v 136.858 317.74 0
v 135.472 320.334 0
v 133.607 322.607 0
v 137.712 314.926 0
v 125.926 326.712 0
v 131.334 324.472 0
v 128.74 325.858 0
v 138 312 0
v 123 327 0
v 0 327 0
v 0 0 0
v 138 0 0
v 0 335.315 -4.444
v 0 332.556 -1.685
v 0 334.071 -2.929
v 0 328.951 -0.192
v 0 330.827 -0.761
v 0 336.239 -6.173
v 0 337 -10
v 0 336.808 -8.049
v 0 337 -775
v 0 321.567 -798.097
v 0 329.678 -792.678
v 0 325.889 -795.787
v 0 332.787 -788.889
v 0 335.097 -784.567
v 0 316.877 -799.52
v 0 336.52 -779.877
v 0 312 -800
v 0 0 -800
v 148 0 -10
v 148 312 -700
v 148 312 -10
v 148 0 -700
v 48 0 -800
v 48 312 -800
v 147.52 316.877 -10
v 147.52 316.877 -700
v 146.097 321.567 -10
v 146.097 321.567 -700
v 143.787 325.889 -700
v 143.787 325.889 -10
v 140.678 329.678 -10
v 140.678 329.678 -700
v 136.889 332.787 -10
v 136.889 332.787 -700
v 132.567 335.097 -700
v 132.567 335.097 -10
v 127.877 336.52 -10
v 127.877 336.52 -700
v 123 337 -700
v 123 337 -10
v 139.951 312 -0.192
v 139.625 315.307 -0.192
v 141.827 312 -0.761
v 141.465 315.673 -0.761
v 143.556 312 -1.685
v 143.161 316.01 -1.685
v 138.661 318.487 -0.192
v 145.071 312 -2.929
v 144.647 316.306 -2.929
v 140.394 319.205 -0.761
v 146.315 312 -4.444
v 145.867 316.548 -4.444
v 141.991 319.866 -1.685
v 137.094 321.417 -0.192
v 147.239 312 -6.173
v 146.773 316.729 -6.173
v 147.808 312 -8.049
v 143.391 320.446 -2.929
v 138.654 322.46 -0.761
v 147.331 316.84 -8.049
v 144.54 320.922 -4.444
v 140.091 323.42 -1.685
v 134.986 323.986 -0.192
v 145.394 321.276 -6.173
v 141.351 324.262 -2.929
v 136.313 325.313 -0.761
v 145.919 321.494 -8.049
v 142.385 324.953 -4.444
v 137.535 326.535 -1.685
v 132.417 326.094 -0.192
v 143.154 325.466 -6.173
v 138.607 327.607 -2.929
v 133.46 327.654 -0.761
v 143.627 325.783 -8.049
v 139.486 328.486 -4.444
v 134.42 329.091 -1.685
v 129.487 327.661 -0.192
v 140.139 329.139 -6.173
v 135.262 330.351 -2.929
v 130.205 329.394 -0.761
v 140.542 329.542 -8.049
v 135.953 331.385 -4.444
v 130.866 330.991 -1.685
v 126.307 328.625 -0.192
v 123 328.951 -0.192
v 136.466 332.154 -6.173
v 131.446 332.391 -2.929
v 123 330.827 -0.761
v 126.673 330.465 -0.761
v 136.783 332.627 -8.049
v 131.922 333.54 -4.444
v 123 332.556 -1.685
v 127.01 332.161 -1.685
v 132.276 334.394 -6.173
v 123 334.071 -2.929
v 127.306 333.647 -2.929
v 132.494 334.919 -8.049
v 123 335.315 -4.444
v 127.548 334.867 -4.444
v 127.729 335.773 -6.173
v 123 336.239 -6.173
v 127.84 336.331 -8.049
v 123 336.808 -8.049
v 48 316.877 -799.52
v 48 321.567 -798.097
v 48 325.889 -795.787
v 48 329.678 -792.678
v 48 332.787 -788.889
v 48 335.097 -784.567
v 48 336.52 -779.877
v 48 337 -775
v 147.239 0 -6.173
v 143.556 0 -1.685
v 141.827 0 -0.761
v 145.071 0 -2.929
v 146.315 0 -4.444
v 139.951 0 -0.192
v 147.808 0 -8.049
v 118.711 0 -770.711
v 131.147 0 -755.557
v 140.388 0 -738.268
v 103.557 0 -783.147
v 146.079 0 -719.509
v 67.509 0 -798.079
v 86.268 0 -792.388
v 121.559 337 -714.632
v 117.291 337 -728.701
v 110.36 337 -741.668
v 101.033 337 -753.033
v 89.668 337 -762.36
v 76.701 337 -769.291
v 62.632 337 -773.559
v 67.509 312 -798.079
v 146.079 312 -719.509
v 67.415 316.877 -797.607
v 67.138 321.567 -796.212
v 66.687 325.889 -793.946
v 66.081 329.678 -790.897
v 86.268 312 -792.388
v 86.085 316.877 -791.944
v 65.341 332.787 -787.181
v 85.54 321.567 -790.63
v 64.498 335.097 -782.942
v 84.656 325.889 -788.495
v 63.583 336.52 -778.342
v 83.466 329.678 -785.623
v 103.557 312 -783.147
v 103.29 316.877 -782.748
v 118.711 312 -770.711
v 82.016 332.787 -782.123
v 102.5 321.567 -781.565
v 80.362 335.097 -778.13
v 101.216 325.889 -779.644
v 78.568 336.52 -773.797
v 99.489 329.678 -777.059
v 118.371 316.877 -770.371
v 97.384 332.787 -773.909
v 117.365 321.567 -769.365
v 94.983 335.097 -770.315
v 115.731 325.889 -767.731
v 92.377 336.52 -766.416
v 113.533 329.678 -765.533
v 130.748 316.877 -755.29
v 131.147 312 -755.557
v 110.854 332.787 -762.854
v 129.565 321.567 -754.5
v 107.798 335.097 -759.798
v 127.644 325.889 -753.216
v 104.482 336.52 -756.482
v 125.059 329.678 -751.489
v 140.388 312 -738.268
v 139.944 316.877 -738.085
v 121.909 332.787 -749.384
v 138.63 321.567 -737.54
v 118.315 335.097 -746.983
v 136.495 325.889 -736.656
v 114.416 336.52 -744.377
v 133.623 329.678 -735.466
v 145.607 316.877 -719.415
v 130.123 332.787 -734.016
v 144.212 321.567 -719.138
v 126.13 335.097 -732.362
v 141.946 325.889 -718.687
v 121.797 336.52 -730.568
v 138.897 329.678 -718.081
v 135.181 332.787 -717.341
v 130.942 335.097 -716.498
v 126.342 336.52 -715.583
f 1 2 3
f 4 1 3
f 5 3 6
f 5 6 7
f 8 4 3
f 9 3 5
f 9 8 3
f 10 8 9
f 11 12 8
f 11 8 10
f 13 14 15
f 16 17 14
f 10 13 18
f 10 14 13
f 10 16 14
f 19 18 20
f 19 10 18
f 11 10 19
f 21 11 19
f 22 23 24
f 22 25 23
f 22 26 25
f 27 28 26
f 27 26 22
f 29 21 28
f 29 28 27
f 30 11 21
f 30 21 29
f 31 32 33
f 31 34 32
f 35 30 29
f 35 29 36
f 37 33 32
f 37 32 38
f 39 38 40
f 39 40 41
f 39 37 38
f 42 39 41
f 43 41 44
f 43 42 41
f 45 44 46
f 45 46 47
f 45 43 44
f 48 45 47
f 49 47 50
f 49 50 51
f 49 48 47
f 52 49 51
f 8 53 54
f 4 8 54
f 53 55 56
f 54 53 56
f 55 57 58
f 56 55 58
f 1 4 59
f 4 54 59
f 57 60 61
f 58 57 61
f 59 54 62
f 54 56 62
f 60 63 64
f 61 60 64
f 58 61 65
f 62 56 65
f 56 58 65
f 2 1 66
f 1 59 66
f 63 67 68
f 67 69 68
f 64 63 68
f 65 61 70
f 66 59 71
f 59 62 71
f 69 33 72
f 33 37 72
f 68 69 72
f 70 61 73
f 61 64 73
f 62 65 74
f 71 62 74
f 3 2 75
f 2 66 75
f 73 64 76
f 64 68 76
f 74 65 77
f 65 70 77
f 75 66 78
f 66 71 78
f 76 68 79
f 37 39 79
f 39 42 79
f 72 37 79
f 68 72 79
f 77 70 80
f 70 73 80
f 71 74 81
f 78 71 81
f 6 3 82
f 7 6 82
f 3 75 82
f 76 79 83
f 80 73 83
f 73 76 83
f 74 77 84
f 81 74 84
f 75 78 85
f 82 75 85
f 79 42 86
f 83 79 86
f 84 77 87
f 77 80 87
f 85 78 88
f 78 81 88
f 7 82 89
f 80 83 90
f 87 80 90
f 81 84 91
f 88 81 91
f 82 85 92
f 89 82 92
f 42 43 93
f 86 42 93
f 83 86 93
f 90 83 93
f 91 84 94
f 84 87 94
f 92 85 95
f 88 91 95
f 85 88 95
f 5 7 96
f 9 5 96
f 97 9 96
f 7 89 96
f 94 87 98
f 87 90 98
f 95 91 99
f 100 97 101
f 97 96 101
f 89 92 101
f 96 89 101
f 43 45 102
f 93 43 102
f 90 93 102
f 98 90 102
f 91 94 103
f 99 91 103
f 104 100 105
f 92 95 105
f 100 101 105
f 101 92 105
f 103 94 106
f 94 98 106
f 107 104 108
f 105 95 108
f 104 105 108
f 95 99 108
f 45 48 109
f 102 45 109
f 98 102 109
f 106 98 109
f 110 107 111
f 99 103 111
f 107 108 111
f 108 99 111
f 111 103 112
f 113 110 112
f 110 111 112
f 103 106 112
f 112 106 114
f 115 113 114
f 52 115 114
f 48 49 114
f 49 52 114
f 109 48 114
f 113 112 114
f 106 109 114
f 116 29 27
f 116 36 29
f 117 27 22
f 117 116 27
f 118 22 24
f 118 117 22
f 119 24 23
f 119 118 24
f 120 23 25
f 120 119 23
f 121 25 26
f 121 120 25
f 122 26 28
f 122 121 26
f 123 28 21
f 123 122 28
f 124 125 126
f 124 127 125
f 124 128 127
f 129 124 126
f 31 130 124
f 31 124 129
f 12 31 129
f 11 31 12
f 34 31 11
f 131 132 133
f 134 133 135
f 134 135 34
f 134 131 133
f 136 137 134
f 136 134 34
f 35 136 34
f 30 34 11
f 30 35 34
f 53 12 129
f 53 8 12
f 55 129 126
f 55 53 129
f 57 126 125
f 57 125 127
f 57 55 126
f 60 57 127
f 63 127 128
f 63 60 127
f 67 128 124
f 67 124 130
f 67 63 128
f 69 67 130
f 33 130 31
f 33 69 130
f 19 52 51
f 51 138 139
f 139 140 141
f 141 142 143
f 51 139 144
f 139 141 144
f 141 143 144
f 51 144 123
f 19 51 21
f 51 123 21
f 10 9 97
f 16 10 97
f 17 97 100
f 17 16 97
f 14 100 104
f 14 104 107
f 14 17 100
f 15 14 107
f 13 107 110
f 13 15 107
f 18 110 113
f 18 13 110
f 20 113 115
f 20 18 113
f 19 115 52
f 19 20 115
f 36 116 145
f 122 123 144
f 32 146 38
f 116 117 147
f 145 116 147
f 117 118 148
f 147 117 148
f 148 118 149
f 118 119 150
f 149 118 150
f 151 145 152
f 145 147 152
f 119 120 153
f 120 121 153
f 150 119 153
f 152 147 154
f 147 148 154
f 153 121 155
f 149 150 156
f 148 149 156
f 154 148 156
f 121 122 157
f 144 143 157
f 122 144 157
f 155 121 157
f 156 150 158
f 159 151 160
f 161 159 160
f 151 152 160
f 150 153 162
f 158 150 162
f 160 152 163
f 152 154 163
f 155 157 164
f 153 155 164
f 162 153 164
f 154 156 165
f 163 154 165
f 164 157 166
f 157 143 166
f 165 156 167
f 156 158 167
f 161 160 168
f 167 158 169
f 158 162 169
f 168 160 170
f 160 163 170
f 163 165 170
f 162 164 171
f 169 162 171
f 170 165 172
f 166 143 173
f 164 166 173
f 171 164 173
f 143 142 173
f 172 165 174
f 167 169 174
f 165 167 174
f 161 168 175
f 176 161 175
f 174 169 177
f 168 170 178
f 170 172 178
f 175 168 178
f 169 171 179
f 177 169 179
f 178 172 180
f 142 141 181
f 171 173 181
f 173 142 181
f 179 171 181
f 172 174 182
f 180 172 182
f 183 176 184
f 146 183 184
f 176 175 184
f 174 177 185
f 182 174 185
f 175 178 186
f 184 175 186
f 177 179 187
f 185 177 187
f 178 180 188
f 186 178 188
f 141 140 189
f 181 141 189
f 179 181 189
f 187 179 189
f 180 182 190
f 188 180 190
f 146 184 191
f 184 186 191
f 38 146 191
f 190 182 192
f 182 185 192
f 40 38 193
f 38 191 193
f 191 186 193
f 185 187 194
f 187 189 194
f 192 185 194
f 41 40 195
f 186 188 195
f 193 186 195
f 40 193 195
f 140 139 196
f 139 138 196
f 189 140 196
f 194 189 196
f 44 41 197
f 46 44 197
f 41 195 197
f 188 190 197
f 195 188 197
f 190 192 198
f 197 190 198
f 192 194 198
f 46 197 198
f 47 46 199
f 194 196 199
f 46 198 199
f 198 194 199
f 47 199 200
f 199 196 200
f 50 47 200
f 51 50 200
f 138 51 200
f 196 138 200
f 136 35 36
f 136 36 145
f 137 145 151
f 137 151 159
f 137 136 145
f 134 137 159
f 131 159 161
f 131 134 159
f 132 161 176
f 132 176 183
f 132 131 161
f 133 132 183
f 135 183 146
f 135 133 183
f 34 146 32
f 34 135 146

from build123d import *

# Parameters (mm, degrees)
EXTRUDE_1_DEPTH = 337
FILLET_1_R      = 25
FILLET_2_R      = 10


with BuildPart() as part:
    # 스케치1 → 보스-돌출1 (new body)
    with BuildSketch(Plane(origin=(0, 0, 0), x_dir=(1, 0, 0), z_dir=(0, 1, 0))):
        with BuildLine():
            Line((0, 0), (0, 800))
            Line((0, 800), (48, 800))
            ThreePointArc((48, 800), (118.710678119, 770.710678119), (148, 700))
            Line((148, 700), (148, 0))
            Line((148, 0), (0, 0))
        make_face()
    extrude(amount=EXTRUDE_1_DEPTH)

    # 필렛1
    fillet_1_edges = [part.edges().sort_by_distance(p)[0] for p in [
        (118.710678119, 337, -770.710678119),
        (24, 337, -800),
        (148, 337, -350),
    ]]
    fillet(fillet_1_edges, radius=FILLET_1_R)

    # 필렛2
    fillet_2_edges = [part.edges().sort_by_distance(p)[0] for p in [
        (148, 156, 0),
        (140.67766953, 329.67766953, 0),
        (61.5, 337, 0),
    ]]
    fillet(fillet_2_edges, radius=FILLET_2_R)


solid = part.part
